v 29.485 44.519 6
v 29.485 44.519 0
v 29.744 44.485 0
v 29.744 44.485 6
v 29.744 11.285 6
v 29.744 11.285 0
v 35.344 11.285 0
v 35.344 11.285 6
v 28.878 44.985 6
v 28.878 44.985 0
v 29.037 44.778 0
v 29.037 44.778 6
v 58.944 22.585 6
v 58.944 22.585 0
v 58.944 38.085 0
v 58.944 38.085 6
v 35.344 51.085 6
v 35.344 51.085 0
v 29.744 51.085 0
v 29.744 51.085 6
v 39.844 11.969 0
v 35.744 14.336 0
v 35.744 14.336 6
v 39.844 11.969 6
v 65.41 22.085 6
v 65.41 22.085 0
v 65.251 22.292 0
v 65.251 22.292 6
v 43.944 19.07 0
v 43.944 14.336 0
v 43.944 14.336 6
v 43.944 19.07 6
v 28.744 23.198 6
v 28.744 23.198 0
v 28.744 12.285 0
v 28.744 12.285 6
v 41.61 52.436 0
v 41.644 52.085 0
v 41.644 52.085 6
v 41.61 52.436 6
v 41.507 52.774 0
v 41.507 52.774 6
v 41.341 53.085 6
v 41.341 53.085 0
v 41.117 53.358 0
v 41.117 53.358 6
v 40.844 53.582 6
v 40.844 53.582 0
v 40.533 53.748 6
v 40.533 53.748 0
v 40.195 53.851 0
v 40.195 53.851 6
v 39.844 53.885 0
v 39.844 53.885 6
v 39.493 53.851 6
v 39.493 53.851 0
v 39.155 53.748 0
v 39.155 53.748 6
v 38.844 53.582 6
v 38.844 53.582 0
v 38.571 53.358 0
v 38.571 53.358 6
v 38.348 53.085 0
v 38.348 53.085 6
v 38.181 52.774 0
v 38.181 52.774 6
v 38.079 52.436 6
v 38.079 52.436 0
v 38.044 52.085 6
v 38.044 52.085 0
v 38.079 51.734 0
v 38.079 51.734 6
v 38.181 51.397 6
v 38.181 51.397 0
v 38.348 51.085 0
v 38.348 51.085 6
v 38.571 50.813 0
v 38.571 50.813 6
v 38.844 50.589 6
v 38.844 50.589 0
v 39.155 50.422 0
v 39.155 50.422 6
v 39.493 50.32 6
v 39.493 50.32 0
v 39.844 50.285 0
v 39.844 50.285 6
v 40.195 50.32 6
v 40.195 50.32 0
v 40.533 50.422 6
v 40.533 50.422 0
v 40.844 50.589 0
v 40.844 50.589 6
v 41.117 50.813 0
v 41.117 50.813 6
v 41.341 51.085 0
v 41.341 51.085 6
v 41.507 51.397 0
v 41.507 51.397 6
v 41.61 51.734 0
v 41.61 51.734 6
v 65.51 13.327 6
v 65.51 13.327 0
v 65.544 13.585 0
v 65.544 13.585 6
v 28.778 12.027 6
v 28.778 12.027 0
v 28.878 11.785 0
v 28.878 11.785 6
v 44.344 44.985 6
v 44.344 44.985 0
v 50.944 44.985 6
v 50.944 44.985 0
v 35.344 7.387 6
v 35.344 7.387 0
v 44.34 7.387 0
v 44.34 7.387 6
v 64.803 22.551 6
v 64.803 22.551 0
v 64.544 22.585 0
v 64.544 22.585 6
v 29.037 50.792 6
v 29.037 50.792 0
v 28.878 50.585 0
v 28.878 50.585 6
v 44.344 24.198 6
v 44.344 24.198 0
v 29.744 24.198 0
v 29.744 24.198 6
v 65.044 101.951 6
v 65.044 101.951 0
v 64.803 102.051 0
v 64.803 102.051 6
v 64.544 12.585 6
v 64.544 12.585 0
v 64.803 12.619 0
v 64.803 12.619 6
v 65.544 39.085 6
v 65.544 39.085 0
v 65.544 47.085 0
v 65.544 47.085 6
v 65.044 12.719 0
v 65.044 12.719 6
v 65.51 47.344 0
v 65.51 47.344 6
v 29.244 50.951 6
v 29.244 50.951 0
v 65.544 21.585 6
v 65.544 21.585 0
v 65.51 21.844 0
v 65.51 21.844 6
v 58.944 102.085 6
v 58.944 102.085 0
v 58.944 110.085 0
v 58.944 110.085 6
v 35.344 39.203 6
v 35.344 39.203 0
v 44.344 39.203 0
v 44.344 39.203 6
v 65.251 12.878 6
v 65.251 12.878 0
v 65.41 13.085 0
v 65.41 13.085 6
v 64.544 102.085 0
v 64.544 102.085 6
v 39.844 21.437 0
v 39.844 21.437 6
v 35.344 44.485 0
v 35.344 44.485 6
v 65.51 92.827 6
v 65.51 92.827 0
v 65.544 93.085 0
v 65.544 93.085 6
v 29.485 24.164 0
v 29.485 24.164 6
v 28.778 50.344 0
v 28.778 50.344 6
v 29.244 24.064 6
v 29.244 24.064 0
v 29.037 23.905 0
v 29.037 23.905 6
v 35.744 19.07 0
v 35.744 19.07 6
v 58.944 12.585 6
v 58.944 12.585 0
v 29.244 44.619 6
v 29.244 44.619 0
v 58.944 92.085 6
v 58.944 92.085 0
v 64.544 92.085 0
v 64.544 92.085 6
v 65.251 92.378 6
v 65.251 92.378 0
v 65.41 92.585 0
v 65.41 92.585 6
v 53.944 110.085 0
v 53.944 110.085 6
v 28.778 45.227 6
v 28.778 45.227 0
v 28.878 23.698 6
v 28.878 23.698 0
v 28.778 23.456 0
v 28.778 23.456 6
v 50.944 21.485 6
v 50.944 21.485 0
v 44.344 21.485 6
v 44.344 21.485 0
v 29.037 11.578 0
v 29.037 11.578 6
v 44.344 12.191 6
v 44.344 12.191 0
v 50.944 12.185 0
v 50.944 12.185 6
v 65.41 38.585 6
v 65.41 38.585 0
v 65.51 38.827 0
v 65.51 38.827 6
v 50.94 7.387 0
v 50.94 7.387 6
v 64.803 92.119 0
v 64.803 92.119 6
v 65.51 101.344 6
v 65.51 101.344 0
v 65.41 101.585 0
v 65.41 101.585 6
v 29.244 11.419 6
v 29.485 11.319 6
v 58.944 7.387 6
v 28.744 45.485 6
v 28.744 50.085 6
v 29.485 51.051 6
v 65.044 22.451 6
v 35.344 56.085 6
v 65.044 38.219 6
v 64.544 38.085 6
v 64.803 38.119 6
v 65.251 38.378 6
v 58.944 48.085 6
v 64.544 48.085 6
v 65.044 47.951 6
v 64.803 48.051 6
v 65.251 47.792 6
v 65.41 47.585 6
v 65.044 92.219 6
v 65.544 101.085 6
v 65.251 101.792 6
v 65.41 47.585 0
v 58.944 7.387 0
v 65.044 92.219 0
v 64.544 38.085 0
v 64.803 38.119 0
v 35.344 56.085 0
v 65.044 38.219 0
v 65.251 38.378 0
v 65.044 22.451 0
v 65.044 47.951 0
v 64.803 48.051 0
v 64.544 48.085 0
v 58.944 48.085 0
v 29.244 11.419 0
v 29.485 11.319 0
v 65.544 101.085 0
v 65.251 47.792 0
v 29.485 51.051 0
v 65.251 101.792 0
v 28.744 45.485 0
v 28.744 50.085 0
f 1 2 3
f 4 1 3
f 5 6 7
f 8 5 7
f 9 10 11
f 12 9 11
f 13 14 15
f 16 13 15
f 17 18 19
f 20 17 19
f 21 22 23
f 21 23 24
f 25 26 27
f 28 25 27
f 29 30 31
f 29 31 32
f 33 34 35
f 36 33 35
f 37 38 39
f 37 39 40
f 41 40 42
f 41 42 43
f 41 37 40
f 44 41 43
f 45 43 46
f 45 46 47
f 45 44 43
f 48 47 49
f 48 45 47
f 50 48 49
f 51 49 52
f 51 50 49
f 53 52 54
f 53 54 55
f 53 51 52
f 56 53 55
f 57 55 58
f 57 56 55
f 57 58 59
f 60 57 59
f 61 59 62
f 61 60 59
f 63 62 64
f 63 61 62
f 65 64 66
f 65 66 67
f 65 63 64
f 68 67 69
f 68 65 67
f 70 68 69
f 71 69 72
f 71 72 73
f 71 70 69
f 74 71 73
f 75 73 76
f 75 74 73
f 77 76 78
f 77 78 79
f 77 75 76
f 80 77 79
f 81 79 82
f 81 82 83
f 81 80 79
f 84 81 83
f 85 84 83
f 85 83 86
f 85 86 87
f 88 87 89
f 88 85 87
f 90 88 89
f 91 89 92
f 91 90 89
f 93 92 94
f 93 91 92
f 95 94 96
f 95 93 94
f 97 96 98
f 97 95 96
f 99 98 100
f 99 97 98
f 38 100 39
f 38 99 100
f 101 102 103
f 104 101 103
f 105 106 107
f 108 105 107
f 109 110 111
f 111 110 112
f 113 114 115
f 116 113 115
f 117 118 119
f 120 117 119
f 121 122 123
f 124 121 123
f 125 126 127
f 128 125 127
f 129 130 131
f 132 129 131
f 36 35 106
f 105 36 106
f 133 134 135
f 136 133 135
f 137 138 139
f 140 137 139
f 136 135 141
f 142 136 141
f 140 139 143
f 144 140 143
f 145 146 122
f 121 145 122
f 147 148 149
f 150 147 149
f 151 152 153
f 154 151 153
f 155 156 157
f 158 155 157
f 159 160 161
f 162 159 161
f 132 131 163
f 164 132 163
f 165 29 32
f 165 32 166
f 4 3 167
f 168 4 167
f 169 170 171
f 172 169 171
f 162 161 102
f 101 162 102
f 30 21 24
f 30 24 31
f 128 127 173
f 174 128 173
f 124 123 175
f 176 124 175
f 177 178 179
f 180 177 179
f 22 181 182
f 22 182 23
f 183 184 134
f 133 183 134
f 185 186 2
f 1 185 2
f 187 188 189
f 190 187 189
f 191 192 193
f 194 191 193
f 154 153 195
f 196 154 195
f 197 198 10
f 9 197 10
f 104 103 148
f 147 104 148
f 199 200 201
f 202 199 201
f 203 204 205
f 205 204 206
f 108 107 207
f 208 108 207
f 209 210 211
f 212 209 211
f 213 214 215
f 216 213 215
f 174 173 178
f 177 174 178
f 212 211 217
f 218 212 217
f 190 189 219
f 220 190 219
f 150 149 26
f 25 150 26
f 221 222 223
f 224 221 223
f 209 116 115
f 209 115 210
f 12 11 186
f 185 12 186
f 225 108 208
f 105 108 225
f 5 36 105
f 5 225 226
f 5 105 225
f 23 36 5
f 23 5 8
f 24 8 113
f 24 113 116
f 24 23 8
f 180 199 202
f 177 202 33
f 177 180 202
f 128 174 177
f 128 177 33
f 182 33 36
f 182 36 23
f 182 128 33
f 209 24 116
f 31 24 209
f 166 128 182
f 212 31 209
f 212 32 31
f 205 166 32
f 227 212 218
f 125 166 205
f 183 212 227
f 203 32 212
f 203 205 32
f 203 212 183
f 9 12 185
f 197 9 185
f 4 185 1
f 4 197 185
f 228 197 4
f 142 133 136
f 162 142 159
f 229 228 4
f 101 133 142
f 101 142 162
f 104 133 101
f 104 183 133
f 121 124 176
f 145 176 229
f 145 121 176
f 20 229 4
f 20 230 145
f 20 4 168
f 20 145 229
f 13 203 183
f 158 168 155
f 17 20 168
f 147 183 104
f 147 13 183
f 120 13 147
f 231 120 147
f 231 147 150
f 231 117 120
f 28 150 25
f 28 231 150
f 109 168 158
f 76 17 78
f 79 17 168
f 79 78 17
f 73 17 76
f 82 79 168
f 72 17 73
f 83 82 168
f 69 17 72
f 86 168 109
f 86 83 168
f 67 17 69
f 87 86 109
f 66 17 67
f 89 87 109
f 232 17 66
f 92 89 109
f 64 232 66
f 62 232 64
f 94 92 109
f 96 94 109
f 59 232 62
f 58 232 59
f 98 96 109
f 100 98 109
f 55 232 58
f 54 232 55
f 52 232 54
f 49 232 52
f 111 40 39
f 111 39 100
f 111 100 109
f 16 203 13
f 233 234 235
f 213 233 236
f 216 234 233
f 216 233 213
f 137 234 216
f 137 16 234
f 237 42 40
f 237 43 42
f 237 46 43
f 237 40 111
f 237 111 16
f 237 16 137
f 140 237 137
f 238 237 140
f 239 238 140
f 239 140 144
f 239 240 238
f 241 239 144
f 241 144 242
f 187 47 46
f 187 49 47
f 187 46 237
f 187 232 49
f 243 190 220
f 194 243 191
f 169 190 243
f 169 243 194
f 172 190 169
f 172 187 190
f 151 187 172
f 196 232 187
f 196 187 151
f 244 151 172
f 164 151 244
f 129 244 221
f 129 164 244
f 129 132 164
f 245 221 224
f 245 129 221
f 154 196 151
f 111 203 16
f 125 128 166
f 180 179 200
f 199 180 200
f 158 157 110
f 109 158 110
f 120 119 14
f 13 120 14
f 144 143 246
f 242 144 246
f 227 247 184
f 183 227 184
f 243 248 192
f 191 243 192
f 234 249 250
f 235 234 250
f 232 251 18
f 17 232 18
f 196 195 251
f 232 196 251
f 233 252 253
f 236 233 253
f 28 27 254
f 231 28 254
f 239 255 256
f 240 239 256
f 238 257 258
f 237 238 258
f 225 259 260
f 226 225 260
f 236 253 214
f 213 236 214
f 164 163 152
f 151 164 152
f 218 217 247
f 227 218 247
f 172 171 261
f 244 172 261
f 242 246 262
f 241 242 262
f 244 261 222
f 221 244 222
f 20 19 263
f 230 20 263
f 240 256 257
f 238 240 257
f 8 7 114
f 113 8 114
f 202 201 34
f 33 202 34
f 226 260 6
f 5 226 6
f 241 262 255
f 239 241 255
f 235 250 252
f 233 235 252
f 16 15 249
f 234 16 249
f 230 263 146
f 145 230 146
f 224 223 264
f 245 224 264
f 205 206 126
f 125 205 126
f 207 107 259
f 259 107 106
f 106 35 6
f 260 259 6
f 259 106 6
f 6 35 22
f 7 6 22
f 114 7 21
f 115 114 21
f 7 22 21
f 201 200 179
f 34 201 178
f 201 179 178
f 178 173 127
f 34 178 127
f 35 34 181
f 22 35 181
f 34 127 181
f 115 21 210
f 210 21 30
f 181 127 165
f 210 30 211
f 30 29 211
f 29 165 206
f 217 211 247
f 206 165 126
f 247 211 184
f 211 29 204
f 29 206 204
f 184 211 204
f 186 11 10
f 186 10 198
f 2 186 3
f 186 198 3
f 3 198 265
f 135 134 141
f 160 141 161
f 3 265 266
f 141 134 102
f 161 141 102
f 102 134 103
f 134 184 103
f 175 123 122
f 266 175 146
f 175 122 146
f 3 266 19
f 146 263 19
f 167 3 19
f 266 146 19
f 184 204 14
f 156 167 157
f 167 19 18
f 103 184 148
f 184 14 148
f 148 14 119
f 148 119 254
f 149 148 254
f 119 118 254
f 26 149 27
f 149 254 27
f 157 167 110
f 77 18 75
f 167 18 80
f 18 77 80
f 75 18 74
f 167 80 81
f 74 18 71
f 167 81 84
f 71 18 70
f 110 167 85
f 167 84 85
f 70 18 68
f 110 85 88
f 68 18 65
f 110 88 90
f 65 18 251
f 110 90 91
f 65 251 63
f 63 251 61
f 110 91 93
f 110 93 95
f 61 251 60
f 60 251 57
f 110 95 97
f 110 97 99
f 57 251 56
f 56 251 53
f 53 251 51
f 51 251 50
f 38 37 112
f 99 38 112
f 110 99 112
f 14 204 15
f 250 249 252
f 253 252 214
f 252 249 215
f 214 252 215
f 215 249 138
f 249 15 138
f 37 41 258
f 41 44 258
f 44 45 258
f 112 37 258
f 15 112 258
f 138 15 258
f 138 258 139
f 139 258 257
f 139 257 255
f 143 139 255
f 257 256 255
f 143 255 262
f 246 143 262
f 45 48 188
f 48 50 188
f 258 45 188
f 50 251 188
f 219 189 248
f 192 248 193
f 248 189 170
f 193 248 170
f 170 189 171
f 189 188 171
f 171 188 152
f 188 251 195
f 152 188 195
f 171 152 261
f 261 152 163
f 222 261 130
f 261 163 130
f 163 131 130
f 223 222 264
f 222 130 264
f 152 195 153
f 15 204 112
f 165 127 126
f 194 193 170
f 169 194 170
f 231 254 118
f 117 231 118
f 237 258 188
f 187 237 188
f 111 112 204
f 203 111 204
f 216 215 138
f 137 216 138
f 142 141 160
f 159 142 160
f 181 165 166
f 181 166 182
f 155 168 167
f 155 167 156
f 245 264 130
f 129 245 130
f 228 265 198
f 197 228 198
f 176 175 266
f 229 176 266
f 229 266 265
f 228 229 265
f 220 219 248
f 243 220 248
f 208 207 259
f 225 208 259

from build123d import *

# Parameters (mm, degrees)
MODEL_R                  = 1.8
RESSALTO_EXTRUS_O1_DEPTH = 6


with BuildPart() as part:
    # Model → Ressalto-extrusão1 (new body)
    with BuildSketch(Plane.XY):
        Polygon((64.544232036, 102.085333217), (58.944232036, 102.085333217), (58.944232036, 110.085333217), (53.944232036, 110.085333217), (35.344232036, 56.085333217), (35.344232036, 51.085333217), (29.744232036, 51.085333217), (29.485412991, 51.051259043), (29.244232036, 50.95135862), (29.037125255, 50.792439998), (28.878206632, 50.585333217), (28.77830621, 50.344152262), (28.744232036, 50.085333217), (28.744232036, 45.485333217), (28.77830621, 45.226514172), (28.878206632, 44.985333217), (29.037125255, 44.778226435), (29.244232036, 44.619307813), (29.485412991, 44.51940739), (29.744232036, 44.485333217), (35.344232036, 44.485333217), (35.344232036, 39.202796806), (44.344232036, 39.202796806), (44.344232036, 44.985333217), (50.944232036, 44.985333217), (50.944232036, 21.485333217), (44.344232036, 21.485333217), (44.344232036, 24.197608641), (29.744232036, 24.197608641), (29.485412991, 24.163534467), (29.244232036, 24.063634044), (29.037125255, 23.904715422), (28.878206632, 23.697608641), (28.77830621, 23.456427686), (28.744232036, 23.197608641), (28.744232036, 12.285333217), (28.77830621, 12.026514172), (28.878206632, 11.785333217), (29.037125255, 11.578226435), (29.244232036, 11.419307813), (29.485412991, 11.31940739), (29.744232036, 11.285333217), (35.344232036, 11.285333217), (35.344232036, 7.387063336), (44.340453402, 7.387063336), (44.344232036, 12.190525094), (50.944232036, 12.185333217), (50.940455526, 7.387063336), (58.944232036, 7.387063336), (58.944232036, 12.585333217), (64.544232036, 12.585333217), (64.803051081, 12.61940739), (65.044232036, 12.719307813), (65.251338817, 12.878226435), (65.41025744, 13.085333217), (65.510157862, 13.326514172), (65.544232036, 13.585333217), (65.544232036, 21.585333217), (65.510157862, 21.844152262), (65.41025744, 22.085333217), (65.251338817, 22.292439998), (65.044232036, 22.45135862), (64.803051081, 22.551259043), (64.544232036, 22.585333217), (58.944232036, 22.585333217), (58.944232036, 38.085333217), (64.544232036, 38.085333217), (64.803051081, 38.11940739), (65.044232036, 38.219307813), (65.251338817, 38.378226435), (65.41025744, 38.585333217), (65.510157862, 38.826514172), (65.544232036, 39.085333217), (65.544232036, 47.085333217), (65.510157862, 47.344152262), (65.41025744, 47.585333217), (65.251338817, 47.792439998), (65.044232036, 47.95135862), (64.803051081, 48.051259043), (64.544232036, 48.085333217), (58.944232036, 48.085333217), (58.944232036, 92.085333217), (64.544232036, 92.085333217), (64.803051081, 92.11940739), (65.044232036, 92.219307813), (65.251338817, 92.378226435), (65.41025744, 92.585333217), (65.510157862, 92.826514172), (65.544232036, 93.085333217), (65.544232036, 101.085333217), (65.510157862, 101.344152262), (65.41025744, 101.585333217), (65.251338817, 101.792439998), (65.044232036, 101.95135862), (64.803051081, 102.051259043), align=None)
        with Locations((39.844232036, 52.085333217)):
            Circle(MODEL_R, mode=Mode.SUBTRACT)
        Polygon((43.944232036, 19.069932909), (39.844232036, 21.437069013), (35.744232036, 19.069932909), (35.744232036, 14.335660702), (39.844232036, 11.968524598), (43.944232036, 14.335660702), align=None, mode=Mode.SUBTRACT)
    extrude(amount=RESSALTO_EXTRUS_O1_DEPTH)


solid = part.part
